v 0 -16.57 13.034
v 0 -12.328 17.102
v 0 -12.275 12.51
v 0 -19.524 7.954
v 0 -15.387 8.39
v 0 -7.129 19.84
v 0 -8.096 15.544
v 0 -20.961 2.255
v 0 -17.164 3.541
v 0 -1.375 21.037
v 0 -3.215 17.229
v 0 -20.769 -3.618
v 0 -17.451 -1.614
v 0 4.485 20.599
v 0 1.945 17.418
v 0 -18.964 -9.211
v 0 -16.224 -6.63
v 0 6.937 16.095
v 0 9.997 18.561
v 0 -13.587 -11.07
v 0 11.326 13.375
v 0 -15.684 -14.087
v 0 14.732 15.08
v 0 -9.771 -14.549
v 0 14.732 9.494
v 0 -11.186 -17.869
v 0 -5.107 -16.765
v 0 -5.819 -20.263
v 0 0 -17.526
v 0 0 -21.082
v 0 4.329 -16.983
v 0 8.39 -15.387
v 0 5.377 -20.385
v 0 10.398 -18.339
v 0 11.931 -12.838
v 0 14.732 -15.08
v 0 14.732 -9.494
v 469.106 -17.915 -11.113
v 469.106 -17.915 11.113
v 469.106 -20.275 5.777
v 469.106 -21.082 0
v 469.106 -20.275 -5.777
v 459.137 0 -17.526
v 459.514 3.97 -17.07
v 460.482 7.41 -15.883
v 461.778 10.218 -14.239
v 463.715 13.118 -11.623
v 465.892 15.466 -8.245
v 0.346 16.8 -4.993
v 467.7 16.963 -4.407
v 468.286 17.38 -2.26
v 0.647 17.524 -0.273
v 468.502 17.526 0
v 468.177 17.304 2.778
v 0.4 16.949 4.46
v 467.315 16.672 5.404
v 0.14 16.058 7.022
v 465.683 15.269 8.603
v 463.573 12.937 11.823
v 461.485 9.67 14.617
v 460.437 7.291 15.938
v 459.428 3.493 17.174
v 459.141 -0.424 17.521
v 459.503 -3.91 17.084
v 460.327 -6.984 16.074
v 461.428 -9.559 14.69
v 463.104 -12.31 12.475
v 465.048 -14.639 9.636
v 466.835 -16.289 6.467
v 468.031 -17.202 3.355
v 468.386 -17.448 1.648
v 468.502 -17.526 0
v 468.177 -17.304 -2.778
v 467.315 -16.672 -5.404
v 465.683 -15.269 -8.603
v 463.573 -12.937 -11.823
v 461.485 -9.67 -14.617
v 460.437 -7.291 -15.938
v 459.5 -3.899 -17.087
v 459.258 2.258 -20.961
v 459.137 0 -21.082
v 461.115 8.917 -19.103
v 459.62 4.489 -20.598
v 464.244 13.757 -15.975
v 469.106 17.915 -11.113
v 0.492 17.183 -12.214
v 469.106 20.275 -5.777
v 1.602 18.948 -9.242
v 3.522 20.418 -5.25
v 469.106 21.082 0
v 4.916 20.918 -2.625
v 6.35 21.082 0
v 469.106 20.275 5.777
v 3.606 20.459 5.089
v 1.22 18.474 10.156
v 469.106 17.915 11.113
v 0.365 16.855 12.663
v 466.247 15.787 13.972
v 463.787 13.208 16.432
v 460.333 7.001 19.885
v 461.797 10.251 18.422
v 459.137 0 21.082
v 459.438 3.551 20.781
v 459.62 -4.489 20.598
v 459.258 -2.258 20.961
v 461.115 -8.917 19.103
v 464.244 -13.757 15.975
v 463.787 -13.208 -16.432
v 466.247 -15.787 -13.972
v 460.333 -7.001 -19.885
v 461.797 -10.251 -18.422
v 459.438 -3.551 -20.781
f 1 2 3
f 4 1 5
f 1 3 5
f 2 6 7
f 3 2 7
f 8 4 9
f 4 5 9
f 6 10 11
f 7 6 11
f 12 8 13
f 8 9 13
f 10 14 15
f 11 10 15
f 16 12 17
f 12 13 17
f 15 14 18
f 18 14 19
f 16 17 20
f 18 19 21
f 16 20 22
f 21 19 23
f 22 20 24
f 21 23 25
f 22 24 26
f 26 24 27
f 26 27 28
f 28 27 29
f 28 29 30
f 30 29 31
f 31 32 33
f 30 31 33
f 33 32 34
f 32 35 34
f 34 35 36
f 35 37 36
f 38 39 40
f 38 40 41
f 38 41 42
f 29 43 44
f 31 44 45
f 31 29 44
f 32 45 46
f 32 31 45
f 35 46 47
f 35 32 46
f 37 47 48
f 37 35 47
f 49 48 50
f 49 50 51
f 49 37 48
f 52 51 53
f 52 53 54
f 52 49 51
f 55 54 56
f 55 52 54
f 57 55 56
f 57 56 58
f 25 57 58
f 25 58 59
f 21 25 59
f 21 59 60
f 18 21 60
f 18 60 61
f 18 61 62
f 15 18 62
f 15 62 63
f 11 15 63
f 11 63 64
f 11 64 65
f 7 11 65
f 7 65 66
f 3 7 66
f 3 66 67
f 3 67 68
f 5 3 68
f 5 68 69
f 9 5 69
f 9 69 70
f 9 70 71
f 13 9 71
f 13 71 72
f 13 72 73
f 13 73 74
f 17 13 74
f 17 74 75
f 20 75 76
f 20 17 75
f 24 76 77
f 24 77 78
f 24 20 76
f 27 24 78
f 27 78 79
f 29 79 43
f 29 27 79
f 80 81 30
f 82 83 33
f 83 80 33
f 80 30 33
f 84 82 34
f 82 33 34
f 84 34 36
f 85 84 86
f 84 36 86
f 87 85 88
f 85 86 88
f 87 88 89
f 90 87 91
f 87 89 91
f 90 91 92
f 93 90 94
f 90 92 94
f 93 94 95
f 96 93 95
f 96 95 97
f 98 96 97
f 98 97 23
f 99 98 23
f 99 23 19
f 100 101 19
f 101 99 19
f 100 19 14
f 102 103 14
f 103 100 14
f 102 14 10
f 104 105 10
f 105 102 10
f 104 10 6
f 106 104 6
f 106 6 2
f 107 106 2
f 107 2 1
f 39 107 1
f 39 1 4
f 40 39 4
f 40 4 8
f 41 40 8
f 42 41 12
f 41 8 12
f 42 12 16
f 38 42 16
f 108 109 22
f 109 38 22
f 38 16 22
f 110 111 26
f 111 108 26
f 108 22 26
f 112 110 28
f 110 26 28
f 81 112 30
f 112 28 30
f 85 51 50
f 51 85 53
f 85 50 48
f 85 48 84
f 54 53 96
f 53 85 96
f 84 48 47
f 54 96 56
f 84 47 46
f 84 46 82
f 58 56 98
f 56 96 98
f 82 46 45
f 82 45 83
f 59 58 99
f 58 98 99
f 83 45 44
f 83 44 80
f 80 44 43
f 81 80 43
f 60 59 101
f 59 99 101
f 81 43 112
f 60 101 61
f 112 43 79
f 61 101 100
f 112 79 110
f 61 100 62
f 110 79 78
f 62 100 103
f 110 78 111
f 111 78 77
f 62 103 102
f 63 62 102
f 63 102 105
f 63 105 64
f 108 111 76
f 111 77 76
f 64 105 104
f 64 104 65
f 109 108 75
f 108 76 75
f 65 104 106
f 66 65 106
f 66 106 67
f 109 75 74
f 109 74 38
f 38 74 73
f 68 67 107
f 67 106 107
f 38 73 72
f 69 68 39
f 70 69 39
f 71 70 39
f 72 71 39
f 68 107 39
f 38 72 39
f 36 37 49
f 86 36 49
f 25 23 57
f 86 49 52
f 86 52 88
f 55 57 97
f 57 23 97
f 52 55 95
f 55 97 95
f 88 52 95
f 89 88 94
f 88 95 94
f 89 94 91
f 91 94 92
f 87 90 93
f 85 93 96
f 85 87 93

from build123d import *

# Parameters (mm, degrees)
SKETCH1_R               = 21.082
SKETCH1_R_2             = 17.526
BOSS_EXTRUDE1_DEPTH     = 469.10625
CUT_EXTRUDE1_DEPTH      = 22.082
CUT_EXTRUDE1_DEPTH_BACK = 22.082
SKETCH3_R               = 21.082
CUT_EXTRUDE2_DEPTH      = 22.0820001
CUT_EXTRUDE2_DEPTH_BACK = 22.0820001


with BuildPart() as part:
    # Sketch1 → Boss-Extrude1 (new body)
    with BuildSketch(Plane(origin=(0, 0, 0), x_dir=(0, 0, -1), z_dir=(1, 0, 0))):
        Circle(SKETCH1_R)
        Circle(SKETCH1_R_2, mode=Mode.SUBTRACT)
    extrude(amount=BOSS_EXTRUDE1_DEPTH)

    # Sketch2 → Cut-Extrude1 (cut, two sides)
    with BuildSketch(Plane.XY) as cut_extrude1_sk:
        with BuildLine():
            Line((0, 21.082), (0, 14.732))
            ThreePointArc((0, 14.732), (1.859871939, 19.222128061), (6.35, 21.082))
            Line((6.35, 21.082), (0, 21.082))
        make_face()
    extrude(amount=CUT_EXTRUDE1_DEPTH, mode=Mode.SUBTRACT)
    extrude(cut_extrude1_sk.sketch, amount=-CUT_EXTRUDE1_DEPTH_BACK, mode=Mode.SUBTRACT)

    # Sketch3 → Cut-Extrude2 (cut, two sides)
    with BuildSketch(Plane.XY) as cut_extrude2_sk:
        with Locations((480.21875, 0)):
            Circle(SKETCH3_R)
    extrude(amount=CUT_EXTRUDE2_DEPTH, mode=Mode.SUBTRACT)
    extrude(cut_extrude2_sk.sketch, amount=-CUT_EXTRUDE2_DEPTH_BACK, mode=Mode.SUBTRACT)


solid = part.part
